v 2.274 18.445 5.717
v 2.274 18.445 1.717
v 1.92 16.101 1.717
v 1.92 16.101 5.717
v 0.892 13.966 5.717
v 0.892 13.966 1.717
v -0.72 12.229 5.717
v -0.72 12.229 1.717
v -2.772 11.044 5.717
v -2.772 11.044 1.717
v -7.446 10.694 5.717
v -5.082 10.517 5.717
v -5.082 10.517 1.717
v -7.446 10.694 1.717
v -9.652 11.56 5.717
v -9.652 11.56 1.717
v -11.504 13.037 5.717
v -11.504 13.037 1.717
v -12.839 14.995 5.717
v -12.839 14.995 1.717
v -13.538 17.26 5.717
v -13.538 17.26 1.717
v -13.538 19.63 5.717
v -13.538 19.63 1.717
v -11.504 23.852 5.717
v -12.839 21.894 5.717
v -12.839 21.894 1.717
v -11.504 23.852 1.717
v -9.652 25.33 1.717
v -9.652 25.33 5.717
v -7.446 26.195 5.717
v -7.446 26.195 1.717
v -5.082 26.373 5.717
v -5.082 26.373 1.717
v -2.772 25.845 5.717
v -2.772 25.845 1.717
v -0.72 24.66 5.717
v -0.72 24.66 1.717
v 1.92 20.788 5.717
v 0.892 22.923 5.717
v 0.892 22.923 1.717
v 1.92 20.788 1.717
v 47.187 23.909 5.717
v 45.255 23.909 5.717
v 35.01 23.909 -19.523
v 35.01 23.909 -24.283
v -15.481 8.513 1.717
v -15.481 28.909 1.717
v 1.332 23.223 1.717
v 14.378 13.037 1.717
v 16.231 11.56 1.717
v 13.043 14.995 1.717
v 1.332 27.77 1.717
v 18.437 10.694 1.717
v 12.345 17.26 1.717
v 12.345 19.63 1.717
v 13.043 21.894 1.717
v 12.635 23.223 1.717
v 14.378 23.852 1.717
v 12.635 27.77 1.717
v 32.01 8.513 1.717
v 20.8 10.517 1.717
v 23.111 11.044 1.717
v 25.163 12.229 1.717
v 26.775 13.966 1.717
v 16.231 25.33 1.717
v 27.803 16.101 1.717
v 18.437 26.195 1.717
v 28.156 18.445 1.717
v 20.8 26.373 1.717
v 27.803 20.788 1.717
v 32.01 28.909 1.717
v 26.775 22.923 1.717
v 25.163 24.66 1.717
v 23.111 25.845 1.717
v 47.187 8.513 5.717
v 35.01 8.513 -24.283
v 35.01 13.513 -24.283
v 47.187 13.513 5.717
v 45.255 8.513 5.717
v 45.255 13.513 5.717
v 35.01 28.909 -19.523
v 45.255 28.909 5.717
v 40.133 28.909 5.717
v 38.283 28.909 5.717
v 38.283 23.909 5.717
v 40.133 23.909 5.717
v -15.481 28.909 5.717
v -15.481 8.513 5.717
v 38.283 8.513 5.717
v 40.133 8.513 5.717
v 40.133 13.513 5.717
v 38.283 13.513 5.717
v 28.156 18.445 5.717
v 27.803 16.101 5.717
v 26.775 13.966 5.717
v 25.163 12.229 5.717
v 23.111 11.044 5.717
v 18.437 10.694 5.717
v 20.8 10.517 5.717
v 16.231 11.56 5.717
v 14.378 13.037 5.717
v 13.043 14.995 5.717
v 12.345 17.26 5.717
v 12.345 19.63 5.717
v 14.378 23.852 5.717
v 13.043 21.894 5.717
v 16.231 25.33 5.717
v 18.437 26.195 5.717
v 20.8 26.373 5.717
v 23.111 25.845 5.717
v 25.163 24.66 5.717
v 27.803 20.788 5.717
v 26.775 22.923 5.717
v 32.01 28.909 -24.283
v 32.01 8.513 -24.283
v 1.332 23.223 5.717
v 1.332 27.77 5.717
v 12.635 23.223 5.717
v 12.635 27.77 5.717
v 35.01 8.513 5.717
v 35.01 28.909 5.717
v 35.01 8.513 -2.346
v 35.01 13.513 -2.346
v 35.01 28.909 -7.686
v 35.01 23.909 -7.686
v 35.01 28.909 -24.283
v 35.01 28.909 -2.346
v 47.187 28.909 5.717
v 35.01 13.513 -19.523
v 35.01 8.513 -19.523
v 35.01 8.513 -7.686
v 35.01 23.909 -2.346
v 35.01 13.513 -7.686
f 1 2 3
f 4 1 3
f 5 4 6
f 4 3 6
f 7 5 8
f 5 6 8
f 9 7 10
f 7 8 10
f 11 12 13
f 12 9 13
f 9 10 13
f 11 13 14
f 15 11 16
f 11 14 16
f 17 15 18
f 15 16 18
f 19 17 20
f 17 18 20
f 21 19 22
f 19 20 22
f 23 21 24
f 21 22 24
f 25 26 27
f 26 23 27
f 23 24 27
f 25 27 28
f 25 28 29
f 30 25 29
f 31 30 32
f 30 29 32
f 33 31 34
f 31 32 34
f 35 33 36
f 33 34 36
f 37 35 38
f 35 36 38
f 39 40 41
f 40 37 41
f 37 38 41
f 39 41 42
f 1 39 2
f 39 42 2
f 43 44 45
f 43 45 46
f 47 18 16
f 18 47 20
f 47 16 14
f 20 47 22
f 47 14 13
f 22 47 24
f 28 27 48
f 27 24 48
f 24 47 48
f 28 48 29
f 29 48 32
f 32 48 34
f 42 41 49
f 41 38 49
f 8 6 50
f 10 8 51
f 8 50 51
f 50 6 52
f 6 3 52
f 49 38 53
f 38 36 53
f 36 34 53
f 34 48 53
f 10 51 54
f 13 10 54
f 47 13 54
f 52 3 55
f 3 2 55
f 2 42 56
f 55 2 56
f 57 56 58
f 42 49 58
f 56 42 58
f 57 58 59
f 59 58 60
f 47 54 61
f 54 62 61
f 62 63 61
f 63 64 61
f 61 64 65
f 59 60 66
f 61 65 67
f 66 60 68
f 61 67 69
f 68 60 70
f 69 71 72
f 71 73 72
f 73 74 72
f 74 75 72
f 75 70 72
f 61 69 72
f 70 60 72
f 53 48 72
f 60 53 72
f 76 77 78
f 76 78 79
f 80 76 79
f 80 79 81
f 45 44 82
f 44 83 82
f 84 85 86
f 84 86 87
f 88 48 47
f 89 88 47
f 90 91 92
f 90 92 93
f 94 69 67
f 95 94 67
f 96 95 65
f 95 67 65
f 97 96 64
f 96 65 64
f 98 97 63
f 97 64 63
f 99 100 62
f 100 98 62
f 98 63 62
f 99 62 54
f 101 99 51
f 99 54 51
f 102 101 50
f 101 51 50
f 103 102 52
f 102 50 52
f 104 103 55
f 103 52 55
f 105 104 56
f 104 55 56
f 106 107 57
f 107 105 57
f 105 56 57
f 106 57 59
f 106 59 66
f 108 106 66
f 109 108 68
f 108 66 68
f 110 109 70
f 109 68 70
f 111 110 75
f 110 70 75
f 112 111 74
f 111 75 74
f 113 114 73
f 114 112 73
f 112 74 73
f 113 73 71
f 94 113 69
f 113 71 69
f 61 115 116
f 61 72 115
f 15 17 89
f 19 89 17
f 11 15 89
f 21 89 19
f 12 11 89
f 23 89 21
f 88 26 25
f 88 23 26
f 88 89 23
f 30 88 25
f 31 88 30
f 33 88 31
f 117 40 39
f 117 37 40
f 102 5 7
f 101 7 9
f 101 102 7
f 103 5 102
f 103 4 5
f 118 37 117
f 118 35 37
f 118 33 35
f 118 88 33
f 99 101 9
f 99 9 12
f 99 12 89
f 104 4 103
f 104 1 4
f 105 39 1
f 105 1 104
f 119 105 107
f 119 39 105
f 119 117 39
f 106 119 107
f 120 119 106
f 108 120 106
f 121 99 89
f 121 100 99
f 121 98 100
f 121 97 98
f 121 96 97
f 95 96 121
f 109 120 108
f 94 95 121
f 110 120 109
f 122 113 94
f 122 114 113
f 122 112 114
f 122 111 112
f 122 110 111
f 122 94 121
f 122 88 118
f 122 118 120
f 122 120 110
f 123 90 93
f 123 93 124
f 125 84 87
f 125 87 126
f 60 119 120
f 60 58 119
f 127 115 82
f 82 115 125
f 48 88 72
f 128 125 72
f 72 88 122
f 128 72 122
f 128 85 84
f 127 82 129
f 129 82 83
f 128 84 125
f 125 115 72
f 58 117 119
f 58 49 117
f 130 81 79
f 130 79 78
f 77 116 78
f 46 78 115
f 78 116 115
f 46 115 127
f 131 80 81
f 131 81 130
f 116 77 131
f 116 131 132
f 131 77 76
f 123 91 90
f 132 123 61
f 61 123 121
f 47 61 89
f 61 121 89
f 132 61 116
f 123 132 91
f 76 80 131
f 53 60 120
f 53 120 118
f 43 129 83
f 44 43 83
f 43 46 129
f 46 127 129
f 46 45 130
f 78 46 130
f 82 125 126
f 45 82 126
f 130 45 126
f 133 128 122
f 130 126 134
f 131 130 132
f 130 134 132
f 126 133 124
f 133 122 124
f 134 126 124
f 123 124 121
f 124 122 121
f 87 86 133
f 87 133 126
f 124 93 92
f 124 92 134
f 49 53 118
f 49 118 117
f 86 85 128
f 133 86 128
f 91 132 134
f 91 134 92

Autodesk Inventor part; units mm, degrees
ref_plane "YZ Plane" through (0, 0, 0) normal (1, 0, 0) x (0, 1, 0)
ref_plane "XZ Plane" through (0, 0, 0) normal (0, 1, 0) x (-1, 0, 0)
ref_plane "XY Plane" through (0, 0, 0) normal (0, 0, 1) x (1, 0, 0)
ref_plane "Work Plane1" through (7.2648, 18.7113, 1.7167) normal (0, 0, 1) x (1, 0, 0)
sketch "Sketch1" plane through (7.2648, 18.7113, 1.7167) normal (0, 0, 1) x (1, 0, 0)
  circle A0 centre (-12.9413, -0.2667) radius 7.9502 projected
  line L0 (-5.933, 4.5118) -> (5.37, 4.5118) projected
  line L1 (5.37, 9.0584) -> (-5.933, 9.0584) projected
  line L2 (5.37, 9.0584) -> (-5.933, 9.0584) projected
  circle A1 centre (-12.9413, -0.2667) radius 7.9502 projected
  circle A2 centre (12.9413, -0.2667) radius 7.9502 projected
  line L3 (22.7457, -10.1981) -> (22.7457, 10.1981)
  line L4 (22.7457, 10.1981) -> (-22.7457, 10.1981) projected
  line L5 (-22.7457, -10.1981) -> (22.7457, -10.1981)
  line L6 (-22.7457, 10.1981) -> (-22.7457, -10.1981)
  line L7 (-5.933, 6.444) -> (-5.933, 4.5118) projected
  line L8 (-5.933, 9.0584) -> (-5.933, 7.1262) projected
  line L9 (5.37, 4.5118) -> (5.37, 9.0584)
  line L10 (-5.933, 9.0584) -> (-5.933, 4.5118)
  circle A3 centre (-12.9413, -0.2667) radius 8.25
  circle A4 centre (12.9413, -0.2667) radius 8.25
  point P0 (-7.2648, -18.7113)
  dimension "d5" = 16.5
  dimension "d6" = 16.5
extrude "Extrusion1" add sketch "Sketch1" along normal blind 4 contours L5 L6 L4 L3 | A3 | A4
sketch "Sketch2" plane through (7.2648, 18.7113, 5.7167) normal (0, 0, 1) x (1, 0, 0)
  line L0 (22.7457, -10.1981) -> (22.7457, 10.1981)
  line L1 (22.7457, 10.1981) -> (27.7457, 10.1981)
  line L2 (27.7457, 10.1981) -> (27.7457, -10.1981)
  line L3 (27.7457, -10.1981) -> (22.7457, -10.1981)
  line L4 (22.7457, -10.1981) -> (22.7457, 10.1981)
  line L5 (24.7457, 10.1981) -> (24.7457, -10.1981)
  point P0 (-7.2648, -18.7113)
  dimension "d7" = 5
  dimension "d8" = 2
extrude "Extrusion3" add sketch "Sketch2" against normal blind 30 contours L5 L1 L2 L3
sketch "Sketch3" plane through (7.2648, 18.7113, 5.7167) normal (0, 0, 1) x (1, 0, 0)
  line L0 (22.7457, -10.1981) -> (22.7457, 10.1981) projected
  line L1 (24.7457, -10.1981) -> (24.7457, 10.1981) projected
  line L2 (22.7457, 10.1981) -> (24.7457, 10.1981)
  line L3 (24.7457, 10.1981) -> (24.7457, -10.1981)
  line L4 (24.7457, -10.1981) -> (22.7457, -10.1981)
  line L5 (22.7457, -10.1981) -> (22.7457, 10.1981)
  point P0 (-7.2648, -18.7113)
extrude "Extrusion4" add sketch "Sketch3" against normal blind 4
sketch "Sketch4" plane through (-15.4809, 28.9094, 5.7167) normal (0, 1, 0) x (1, 0, 0)
  line L0 (50.4914, 0) -> (50.4914, 30) projected
  line L1 (50.4914, 30) -> (62.668, 0)
  line L2 (62.668, 0) -> (60.736, 0)
  line L3 (60.736, 0) -> (50.4914, 25.24)
  line L4 (55.6137, 0) -> (50.4914, 13.4027)
  line L5 (53.764, 0) -> (50.4914, 8.0628)
  line L6 (50.4914, 13.4027) -> (50.4914, 8.0628)
  line L7 (53.764, 0) -> (55.6137, 0)
  point P0 (15.4809, 5.7167)
extrude "Extrusion5" add sketch "Sketch4" against normal blind 5
sketch "Sketch5" plane through (-15.4809, 8.5132, 1.7167) normal (0, -1, 0) x (1, 0, 0)
  line L0 (50.4914, -26) -> (50.4914, -21.24) projected
  line L1 (50.4914, -26) -> (62.668, 4) projected
  line L2 (62.668, 4) -> (60.736, 4) projected
  line L3 (60.736, 4) -> (50.4914, -21.24) projected
  line L4 (50.4914, -9.4027) -> (50.4914, -4.0628) projected
  line L5 (50.4914, -9.4027) -> (55.6137, 4) projected
  line L6 (55.6137, 4) -> (53.764, 4) projected
  line L7 (53.764, 4) -> (50.4914, -4.0628) projected
  point P0 (15.4809, -1.7167)
extrude "Extrusion6" add sketch "Sketch5" against normal blind 5
properties part number "USsensor holder"
